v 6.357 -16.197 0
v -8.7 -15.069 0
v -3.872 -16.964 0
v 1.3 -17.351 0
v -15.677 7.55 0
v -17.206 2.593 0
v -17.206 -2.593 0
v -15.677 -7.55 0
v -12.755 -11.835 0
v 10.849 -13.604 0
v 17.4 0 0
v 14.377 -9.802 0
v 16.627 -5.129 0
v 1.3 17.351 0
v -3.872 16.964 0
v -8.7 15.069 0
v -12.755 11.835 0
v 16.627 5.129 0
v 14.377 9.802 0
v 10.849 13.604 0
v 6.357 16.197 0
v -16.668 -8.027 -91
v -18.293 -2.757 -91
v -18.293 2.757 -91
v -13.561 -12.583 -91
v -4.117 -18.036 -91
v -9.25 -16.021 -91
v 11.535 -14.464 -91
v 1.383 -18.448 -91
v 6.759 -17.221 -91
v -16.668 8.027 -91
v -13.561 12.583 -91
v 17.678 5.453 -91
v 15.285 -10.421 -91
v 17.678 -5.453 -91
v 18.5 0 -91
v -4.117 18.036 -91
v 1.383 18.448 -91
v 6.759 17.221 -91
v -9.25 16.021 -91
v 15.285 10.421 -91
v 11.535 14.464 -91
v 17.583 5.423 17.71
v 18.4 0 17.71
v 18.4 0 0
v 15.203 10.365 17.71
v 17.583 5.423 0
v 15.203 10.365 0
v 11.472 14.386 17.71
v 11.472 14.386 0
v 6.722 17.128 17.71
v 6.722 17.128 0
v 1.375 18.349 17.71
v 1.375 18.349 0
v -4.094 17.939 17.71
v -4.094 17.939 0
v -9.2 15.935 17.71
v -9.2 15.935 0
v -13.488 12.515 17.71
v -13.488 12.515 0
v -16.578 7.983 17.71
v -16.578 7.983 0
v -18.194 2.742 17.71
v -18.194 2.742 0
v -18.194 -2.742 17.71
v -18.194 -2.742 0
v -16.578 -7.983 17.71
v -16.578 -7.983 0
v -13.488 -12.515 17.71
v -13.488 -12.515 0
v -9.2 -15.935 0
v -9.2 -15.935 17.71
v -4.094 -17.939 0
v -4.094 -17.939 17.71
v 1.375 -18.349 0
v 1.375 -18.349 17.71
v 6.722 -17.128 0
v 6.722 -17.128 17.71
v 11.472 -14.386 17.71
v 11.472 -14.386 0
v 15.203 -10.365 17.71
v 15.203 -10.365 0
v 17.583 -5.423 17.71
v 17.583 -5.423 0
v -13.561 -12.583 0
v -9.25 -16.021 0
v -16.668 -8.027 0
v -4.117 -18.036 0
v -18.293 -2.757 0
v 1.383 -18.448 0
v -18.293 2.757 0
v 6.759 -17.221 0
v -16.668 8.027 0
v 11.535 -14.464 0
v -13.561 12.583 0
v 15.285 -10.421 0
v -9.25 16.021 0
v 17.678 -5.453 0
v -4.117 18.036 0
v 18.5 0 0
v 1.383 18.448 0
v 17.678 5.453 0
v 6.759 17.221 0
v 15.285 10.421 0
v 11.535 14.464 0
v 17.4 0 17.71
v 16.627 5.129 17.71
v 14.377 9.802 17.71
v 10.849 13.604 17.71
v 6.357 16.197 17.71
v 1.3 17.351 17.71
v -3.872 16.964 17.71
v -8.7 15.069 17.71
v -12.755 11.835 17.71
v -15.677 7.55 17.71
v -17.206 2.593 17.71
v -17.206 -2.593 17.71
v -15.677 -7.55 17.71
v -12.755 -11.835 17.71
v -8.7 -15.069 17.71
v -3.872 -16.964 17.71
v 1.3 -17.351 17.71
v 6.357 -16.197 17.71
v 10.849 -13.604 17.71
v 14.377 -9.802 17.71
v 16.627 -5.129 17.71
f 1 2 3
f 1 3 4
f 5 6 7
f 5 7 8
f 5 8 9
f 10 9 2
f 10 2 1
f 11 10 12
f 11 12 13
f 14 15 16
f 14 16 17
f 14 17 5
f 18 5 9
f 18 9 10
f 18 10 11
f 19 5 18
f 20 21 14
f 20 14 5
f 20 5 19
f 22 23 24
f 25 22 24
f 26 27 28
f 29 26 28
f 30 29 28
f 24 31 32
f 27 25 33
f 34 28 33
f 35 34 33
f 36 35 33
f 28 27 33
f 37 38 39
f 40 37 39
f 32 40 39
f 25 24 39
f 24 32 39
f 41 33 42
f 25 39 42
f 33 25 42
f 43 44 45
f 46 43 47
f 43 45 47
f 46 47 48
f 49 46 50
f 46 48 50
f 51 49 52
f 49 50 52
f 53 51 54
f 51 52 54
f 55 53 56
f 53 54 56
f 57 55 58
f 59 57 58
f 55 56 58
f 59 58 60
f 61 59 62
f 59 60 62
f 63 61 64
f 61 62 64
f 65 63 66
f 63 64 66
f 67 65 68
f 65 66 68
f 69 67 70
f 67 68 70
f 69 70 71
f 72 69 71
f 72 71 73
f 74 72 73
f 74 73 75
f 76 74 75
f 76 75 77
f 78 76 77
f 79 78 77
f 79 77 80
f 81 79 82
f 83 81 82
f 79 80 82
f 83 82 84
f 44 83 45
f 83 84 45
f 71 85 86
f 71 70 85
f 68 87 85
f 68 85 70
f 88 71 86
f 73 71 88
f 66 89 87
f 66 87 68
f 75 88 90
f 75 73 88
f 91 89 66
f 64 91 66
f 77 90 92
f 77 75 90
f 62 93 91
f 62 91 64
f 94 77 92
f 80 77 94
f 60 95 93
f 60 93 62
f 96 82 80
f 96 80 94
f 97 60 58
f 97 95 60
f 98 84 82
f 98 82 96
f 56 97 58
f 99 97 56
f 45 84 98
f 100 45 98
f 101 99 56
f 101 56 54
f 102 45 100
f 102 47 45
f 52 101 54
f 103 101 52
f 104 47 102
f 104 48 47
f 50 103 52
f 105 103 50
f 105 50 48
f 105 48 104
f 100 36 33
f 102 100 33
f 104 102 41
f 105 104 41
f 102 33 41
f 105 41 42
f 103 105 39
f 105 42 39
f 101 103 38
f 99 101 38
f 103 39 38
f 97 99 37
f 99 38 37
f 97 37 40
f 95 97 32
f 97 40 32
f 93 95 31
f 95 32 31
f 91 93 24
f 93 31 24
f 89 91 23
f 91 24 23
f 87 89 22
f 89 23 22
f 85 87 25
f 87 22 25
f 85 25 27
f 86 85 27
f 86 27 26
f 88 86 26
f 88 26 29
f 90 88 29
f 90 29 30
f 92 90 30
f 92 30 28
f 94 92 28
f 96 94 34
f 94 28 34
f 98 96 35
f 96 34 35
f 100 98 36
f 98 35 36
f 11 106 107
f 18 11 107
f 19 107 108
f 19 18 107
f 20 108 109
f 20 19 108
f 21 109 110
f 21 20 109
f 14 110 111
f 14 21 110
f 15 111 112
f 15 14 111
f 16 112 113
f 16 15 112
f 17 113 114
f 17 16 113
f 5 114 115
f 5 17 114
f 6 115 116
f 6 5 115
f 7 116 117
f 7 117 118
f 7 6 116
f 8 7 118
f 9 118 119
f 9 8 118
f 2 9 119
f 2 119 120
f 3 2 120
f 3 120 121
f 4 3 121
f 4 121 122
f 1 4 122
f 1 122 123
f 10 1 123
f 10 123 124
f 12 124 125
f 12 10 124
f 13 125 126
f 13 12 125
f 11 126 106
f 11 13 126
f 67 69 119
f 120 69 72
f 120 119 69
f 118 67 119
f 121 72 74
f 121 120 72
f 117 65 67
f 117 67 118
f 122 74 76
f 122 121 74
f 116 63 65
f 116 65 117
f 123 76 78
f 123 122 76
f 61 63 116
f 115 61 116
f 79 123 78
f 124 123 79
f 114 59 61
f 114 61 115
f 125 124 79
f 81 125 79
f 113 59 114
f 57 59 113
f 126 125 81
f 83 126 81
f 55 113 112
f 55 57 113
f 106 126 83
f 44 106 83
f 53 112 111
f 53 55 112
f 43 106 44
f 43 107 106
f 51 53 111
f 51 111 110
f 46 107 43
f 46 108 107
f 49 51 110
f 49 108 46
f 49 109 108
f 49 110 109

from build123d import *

# Parameters (mm, degrees)
SKETCH1_R           = 18.4
SKETCH1_R_2         = 17.4
BOSS_EXTRUDE1_DEPTH = 17.71
BOSS_EXTRUDE2_START = -91
SKETCH1_2_R         = 18.5
SKETCH1_2_R_2       = 17.4
SKETCH1_2_R_3       = 18.4
BOSS_EXTRUDE2_DEPTH = 91


with BuildPart() as part:
    # Sketch1 → Boss-Extrude1 (new body)
    with BuildSketch(Plane.XY):
        Circle(SKETCH1_R)
        Circle(SKETCH1_R_2, mode=Mode.SUBTRACT)
    extrude(amount=BOSS_EXTRUDE1_DEPTH)

    # Sketch1<2> → Boss-Extrude2 (add)
    # profile 1 of 3: a face of its own
    with BuildSketch(Plane.XY.offset(BOSS_EXTRUDE2_START)):
        Circle(SKETCH1_2_R)
        Circle(SKETCH1_2_R_2, mode=Mode.SUBTRACT)
    # profile 2 of 3: a face of its own
    with BuildSketch(Plane.XY.offset(BOSS_EXTRUDE2_START)):
        Circle(SKETCH1_2_R)
        Circle(SKETCH1_2_R_3, mode=Mode.SUBTRACT)
    # profile 3 of 3: a face of its own
    with BuildSketch(Plane.XY.offset(BOSS_EXTRUDE2_START)):
        Circle(SKETCH1_2_R_2)
    extrude(amount=BOSS_EXTRUDE2_DEPTH)


solid = part.part
